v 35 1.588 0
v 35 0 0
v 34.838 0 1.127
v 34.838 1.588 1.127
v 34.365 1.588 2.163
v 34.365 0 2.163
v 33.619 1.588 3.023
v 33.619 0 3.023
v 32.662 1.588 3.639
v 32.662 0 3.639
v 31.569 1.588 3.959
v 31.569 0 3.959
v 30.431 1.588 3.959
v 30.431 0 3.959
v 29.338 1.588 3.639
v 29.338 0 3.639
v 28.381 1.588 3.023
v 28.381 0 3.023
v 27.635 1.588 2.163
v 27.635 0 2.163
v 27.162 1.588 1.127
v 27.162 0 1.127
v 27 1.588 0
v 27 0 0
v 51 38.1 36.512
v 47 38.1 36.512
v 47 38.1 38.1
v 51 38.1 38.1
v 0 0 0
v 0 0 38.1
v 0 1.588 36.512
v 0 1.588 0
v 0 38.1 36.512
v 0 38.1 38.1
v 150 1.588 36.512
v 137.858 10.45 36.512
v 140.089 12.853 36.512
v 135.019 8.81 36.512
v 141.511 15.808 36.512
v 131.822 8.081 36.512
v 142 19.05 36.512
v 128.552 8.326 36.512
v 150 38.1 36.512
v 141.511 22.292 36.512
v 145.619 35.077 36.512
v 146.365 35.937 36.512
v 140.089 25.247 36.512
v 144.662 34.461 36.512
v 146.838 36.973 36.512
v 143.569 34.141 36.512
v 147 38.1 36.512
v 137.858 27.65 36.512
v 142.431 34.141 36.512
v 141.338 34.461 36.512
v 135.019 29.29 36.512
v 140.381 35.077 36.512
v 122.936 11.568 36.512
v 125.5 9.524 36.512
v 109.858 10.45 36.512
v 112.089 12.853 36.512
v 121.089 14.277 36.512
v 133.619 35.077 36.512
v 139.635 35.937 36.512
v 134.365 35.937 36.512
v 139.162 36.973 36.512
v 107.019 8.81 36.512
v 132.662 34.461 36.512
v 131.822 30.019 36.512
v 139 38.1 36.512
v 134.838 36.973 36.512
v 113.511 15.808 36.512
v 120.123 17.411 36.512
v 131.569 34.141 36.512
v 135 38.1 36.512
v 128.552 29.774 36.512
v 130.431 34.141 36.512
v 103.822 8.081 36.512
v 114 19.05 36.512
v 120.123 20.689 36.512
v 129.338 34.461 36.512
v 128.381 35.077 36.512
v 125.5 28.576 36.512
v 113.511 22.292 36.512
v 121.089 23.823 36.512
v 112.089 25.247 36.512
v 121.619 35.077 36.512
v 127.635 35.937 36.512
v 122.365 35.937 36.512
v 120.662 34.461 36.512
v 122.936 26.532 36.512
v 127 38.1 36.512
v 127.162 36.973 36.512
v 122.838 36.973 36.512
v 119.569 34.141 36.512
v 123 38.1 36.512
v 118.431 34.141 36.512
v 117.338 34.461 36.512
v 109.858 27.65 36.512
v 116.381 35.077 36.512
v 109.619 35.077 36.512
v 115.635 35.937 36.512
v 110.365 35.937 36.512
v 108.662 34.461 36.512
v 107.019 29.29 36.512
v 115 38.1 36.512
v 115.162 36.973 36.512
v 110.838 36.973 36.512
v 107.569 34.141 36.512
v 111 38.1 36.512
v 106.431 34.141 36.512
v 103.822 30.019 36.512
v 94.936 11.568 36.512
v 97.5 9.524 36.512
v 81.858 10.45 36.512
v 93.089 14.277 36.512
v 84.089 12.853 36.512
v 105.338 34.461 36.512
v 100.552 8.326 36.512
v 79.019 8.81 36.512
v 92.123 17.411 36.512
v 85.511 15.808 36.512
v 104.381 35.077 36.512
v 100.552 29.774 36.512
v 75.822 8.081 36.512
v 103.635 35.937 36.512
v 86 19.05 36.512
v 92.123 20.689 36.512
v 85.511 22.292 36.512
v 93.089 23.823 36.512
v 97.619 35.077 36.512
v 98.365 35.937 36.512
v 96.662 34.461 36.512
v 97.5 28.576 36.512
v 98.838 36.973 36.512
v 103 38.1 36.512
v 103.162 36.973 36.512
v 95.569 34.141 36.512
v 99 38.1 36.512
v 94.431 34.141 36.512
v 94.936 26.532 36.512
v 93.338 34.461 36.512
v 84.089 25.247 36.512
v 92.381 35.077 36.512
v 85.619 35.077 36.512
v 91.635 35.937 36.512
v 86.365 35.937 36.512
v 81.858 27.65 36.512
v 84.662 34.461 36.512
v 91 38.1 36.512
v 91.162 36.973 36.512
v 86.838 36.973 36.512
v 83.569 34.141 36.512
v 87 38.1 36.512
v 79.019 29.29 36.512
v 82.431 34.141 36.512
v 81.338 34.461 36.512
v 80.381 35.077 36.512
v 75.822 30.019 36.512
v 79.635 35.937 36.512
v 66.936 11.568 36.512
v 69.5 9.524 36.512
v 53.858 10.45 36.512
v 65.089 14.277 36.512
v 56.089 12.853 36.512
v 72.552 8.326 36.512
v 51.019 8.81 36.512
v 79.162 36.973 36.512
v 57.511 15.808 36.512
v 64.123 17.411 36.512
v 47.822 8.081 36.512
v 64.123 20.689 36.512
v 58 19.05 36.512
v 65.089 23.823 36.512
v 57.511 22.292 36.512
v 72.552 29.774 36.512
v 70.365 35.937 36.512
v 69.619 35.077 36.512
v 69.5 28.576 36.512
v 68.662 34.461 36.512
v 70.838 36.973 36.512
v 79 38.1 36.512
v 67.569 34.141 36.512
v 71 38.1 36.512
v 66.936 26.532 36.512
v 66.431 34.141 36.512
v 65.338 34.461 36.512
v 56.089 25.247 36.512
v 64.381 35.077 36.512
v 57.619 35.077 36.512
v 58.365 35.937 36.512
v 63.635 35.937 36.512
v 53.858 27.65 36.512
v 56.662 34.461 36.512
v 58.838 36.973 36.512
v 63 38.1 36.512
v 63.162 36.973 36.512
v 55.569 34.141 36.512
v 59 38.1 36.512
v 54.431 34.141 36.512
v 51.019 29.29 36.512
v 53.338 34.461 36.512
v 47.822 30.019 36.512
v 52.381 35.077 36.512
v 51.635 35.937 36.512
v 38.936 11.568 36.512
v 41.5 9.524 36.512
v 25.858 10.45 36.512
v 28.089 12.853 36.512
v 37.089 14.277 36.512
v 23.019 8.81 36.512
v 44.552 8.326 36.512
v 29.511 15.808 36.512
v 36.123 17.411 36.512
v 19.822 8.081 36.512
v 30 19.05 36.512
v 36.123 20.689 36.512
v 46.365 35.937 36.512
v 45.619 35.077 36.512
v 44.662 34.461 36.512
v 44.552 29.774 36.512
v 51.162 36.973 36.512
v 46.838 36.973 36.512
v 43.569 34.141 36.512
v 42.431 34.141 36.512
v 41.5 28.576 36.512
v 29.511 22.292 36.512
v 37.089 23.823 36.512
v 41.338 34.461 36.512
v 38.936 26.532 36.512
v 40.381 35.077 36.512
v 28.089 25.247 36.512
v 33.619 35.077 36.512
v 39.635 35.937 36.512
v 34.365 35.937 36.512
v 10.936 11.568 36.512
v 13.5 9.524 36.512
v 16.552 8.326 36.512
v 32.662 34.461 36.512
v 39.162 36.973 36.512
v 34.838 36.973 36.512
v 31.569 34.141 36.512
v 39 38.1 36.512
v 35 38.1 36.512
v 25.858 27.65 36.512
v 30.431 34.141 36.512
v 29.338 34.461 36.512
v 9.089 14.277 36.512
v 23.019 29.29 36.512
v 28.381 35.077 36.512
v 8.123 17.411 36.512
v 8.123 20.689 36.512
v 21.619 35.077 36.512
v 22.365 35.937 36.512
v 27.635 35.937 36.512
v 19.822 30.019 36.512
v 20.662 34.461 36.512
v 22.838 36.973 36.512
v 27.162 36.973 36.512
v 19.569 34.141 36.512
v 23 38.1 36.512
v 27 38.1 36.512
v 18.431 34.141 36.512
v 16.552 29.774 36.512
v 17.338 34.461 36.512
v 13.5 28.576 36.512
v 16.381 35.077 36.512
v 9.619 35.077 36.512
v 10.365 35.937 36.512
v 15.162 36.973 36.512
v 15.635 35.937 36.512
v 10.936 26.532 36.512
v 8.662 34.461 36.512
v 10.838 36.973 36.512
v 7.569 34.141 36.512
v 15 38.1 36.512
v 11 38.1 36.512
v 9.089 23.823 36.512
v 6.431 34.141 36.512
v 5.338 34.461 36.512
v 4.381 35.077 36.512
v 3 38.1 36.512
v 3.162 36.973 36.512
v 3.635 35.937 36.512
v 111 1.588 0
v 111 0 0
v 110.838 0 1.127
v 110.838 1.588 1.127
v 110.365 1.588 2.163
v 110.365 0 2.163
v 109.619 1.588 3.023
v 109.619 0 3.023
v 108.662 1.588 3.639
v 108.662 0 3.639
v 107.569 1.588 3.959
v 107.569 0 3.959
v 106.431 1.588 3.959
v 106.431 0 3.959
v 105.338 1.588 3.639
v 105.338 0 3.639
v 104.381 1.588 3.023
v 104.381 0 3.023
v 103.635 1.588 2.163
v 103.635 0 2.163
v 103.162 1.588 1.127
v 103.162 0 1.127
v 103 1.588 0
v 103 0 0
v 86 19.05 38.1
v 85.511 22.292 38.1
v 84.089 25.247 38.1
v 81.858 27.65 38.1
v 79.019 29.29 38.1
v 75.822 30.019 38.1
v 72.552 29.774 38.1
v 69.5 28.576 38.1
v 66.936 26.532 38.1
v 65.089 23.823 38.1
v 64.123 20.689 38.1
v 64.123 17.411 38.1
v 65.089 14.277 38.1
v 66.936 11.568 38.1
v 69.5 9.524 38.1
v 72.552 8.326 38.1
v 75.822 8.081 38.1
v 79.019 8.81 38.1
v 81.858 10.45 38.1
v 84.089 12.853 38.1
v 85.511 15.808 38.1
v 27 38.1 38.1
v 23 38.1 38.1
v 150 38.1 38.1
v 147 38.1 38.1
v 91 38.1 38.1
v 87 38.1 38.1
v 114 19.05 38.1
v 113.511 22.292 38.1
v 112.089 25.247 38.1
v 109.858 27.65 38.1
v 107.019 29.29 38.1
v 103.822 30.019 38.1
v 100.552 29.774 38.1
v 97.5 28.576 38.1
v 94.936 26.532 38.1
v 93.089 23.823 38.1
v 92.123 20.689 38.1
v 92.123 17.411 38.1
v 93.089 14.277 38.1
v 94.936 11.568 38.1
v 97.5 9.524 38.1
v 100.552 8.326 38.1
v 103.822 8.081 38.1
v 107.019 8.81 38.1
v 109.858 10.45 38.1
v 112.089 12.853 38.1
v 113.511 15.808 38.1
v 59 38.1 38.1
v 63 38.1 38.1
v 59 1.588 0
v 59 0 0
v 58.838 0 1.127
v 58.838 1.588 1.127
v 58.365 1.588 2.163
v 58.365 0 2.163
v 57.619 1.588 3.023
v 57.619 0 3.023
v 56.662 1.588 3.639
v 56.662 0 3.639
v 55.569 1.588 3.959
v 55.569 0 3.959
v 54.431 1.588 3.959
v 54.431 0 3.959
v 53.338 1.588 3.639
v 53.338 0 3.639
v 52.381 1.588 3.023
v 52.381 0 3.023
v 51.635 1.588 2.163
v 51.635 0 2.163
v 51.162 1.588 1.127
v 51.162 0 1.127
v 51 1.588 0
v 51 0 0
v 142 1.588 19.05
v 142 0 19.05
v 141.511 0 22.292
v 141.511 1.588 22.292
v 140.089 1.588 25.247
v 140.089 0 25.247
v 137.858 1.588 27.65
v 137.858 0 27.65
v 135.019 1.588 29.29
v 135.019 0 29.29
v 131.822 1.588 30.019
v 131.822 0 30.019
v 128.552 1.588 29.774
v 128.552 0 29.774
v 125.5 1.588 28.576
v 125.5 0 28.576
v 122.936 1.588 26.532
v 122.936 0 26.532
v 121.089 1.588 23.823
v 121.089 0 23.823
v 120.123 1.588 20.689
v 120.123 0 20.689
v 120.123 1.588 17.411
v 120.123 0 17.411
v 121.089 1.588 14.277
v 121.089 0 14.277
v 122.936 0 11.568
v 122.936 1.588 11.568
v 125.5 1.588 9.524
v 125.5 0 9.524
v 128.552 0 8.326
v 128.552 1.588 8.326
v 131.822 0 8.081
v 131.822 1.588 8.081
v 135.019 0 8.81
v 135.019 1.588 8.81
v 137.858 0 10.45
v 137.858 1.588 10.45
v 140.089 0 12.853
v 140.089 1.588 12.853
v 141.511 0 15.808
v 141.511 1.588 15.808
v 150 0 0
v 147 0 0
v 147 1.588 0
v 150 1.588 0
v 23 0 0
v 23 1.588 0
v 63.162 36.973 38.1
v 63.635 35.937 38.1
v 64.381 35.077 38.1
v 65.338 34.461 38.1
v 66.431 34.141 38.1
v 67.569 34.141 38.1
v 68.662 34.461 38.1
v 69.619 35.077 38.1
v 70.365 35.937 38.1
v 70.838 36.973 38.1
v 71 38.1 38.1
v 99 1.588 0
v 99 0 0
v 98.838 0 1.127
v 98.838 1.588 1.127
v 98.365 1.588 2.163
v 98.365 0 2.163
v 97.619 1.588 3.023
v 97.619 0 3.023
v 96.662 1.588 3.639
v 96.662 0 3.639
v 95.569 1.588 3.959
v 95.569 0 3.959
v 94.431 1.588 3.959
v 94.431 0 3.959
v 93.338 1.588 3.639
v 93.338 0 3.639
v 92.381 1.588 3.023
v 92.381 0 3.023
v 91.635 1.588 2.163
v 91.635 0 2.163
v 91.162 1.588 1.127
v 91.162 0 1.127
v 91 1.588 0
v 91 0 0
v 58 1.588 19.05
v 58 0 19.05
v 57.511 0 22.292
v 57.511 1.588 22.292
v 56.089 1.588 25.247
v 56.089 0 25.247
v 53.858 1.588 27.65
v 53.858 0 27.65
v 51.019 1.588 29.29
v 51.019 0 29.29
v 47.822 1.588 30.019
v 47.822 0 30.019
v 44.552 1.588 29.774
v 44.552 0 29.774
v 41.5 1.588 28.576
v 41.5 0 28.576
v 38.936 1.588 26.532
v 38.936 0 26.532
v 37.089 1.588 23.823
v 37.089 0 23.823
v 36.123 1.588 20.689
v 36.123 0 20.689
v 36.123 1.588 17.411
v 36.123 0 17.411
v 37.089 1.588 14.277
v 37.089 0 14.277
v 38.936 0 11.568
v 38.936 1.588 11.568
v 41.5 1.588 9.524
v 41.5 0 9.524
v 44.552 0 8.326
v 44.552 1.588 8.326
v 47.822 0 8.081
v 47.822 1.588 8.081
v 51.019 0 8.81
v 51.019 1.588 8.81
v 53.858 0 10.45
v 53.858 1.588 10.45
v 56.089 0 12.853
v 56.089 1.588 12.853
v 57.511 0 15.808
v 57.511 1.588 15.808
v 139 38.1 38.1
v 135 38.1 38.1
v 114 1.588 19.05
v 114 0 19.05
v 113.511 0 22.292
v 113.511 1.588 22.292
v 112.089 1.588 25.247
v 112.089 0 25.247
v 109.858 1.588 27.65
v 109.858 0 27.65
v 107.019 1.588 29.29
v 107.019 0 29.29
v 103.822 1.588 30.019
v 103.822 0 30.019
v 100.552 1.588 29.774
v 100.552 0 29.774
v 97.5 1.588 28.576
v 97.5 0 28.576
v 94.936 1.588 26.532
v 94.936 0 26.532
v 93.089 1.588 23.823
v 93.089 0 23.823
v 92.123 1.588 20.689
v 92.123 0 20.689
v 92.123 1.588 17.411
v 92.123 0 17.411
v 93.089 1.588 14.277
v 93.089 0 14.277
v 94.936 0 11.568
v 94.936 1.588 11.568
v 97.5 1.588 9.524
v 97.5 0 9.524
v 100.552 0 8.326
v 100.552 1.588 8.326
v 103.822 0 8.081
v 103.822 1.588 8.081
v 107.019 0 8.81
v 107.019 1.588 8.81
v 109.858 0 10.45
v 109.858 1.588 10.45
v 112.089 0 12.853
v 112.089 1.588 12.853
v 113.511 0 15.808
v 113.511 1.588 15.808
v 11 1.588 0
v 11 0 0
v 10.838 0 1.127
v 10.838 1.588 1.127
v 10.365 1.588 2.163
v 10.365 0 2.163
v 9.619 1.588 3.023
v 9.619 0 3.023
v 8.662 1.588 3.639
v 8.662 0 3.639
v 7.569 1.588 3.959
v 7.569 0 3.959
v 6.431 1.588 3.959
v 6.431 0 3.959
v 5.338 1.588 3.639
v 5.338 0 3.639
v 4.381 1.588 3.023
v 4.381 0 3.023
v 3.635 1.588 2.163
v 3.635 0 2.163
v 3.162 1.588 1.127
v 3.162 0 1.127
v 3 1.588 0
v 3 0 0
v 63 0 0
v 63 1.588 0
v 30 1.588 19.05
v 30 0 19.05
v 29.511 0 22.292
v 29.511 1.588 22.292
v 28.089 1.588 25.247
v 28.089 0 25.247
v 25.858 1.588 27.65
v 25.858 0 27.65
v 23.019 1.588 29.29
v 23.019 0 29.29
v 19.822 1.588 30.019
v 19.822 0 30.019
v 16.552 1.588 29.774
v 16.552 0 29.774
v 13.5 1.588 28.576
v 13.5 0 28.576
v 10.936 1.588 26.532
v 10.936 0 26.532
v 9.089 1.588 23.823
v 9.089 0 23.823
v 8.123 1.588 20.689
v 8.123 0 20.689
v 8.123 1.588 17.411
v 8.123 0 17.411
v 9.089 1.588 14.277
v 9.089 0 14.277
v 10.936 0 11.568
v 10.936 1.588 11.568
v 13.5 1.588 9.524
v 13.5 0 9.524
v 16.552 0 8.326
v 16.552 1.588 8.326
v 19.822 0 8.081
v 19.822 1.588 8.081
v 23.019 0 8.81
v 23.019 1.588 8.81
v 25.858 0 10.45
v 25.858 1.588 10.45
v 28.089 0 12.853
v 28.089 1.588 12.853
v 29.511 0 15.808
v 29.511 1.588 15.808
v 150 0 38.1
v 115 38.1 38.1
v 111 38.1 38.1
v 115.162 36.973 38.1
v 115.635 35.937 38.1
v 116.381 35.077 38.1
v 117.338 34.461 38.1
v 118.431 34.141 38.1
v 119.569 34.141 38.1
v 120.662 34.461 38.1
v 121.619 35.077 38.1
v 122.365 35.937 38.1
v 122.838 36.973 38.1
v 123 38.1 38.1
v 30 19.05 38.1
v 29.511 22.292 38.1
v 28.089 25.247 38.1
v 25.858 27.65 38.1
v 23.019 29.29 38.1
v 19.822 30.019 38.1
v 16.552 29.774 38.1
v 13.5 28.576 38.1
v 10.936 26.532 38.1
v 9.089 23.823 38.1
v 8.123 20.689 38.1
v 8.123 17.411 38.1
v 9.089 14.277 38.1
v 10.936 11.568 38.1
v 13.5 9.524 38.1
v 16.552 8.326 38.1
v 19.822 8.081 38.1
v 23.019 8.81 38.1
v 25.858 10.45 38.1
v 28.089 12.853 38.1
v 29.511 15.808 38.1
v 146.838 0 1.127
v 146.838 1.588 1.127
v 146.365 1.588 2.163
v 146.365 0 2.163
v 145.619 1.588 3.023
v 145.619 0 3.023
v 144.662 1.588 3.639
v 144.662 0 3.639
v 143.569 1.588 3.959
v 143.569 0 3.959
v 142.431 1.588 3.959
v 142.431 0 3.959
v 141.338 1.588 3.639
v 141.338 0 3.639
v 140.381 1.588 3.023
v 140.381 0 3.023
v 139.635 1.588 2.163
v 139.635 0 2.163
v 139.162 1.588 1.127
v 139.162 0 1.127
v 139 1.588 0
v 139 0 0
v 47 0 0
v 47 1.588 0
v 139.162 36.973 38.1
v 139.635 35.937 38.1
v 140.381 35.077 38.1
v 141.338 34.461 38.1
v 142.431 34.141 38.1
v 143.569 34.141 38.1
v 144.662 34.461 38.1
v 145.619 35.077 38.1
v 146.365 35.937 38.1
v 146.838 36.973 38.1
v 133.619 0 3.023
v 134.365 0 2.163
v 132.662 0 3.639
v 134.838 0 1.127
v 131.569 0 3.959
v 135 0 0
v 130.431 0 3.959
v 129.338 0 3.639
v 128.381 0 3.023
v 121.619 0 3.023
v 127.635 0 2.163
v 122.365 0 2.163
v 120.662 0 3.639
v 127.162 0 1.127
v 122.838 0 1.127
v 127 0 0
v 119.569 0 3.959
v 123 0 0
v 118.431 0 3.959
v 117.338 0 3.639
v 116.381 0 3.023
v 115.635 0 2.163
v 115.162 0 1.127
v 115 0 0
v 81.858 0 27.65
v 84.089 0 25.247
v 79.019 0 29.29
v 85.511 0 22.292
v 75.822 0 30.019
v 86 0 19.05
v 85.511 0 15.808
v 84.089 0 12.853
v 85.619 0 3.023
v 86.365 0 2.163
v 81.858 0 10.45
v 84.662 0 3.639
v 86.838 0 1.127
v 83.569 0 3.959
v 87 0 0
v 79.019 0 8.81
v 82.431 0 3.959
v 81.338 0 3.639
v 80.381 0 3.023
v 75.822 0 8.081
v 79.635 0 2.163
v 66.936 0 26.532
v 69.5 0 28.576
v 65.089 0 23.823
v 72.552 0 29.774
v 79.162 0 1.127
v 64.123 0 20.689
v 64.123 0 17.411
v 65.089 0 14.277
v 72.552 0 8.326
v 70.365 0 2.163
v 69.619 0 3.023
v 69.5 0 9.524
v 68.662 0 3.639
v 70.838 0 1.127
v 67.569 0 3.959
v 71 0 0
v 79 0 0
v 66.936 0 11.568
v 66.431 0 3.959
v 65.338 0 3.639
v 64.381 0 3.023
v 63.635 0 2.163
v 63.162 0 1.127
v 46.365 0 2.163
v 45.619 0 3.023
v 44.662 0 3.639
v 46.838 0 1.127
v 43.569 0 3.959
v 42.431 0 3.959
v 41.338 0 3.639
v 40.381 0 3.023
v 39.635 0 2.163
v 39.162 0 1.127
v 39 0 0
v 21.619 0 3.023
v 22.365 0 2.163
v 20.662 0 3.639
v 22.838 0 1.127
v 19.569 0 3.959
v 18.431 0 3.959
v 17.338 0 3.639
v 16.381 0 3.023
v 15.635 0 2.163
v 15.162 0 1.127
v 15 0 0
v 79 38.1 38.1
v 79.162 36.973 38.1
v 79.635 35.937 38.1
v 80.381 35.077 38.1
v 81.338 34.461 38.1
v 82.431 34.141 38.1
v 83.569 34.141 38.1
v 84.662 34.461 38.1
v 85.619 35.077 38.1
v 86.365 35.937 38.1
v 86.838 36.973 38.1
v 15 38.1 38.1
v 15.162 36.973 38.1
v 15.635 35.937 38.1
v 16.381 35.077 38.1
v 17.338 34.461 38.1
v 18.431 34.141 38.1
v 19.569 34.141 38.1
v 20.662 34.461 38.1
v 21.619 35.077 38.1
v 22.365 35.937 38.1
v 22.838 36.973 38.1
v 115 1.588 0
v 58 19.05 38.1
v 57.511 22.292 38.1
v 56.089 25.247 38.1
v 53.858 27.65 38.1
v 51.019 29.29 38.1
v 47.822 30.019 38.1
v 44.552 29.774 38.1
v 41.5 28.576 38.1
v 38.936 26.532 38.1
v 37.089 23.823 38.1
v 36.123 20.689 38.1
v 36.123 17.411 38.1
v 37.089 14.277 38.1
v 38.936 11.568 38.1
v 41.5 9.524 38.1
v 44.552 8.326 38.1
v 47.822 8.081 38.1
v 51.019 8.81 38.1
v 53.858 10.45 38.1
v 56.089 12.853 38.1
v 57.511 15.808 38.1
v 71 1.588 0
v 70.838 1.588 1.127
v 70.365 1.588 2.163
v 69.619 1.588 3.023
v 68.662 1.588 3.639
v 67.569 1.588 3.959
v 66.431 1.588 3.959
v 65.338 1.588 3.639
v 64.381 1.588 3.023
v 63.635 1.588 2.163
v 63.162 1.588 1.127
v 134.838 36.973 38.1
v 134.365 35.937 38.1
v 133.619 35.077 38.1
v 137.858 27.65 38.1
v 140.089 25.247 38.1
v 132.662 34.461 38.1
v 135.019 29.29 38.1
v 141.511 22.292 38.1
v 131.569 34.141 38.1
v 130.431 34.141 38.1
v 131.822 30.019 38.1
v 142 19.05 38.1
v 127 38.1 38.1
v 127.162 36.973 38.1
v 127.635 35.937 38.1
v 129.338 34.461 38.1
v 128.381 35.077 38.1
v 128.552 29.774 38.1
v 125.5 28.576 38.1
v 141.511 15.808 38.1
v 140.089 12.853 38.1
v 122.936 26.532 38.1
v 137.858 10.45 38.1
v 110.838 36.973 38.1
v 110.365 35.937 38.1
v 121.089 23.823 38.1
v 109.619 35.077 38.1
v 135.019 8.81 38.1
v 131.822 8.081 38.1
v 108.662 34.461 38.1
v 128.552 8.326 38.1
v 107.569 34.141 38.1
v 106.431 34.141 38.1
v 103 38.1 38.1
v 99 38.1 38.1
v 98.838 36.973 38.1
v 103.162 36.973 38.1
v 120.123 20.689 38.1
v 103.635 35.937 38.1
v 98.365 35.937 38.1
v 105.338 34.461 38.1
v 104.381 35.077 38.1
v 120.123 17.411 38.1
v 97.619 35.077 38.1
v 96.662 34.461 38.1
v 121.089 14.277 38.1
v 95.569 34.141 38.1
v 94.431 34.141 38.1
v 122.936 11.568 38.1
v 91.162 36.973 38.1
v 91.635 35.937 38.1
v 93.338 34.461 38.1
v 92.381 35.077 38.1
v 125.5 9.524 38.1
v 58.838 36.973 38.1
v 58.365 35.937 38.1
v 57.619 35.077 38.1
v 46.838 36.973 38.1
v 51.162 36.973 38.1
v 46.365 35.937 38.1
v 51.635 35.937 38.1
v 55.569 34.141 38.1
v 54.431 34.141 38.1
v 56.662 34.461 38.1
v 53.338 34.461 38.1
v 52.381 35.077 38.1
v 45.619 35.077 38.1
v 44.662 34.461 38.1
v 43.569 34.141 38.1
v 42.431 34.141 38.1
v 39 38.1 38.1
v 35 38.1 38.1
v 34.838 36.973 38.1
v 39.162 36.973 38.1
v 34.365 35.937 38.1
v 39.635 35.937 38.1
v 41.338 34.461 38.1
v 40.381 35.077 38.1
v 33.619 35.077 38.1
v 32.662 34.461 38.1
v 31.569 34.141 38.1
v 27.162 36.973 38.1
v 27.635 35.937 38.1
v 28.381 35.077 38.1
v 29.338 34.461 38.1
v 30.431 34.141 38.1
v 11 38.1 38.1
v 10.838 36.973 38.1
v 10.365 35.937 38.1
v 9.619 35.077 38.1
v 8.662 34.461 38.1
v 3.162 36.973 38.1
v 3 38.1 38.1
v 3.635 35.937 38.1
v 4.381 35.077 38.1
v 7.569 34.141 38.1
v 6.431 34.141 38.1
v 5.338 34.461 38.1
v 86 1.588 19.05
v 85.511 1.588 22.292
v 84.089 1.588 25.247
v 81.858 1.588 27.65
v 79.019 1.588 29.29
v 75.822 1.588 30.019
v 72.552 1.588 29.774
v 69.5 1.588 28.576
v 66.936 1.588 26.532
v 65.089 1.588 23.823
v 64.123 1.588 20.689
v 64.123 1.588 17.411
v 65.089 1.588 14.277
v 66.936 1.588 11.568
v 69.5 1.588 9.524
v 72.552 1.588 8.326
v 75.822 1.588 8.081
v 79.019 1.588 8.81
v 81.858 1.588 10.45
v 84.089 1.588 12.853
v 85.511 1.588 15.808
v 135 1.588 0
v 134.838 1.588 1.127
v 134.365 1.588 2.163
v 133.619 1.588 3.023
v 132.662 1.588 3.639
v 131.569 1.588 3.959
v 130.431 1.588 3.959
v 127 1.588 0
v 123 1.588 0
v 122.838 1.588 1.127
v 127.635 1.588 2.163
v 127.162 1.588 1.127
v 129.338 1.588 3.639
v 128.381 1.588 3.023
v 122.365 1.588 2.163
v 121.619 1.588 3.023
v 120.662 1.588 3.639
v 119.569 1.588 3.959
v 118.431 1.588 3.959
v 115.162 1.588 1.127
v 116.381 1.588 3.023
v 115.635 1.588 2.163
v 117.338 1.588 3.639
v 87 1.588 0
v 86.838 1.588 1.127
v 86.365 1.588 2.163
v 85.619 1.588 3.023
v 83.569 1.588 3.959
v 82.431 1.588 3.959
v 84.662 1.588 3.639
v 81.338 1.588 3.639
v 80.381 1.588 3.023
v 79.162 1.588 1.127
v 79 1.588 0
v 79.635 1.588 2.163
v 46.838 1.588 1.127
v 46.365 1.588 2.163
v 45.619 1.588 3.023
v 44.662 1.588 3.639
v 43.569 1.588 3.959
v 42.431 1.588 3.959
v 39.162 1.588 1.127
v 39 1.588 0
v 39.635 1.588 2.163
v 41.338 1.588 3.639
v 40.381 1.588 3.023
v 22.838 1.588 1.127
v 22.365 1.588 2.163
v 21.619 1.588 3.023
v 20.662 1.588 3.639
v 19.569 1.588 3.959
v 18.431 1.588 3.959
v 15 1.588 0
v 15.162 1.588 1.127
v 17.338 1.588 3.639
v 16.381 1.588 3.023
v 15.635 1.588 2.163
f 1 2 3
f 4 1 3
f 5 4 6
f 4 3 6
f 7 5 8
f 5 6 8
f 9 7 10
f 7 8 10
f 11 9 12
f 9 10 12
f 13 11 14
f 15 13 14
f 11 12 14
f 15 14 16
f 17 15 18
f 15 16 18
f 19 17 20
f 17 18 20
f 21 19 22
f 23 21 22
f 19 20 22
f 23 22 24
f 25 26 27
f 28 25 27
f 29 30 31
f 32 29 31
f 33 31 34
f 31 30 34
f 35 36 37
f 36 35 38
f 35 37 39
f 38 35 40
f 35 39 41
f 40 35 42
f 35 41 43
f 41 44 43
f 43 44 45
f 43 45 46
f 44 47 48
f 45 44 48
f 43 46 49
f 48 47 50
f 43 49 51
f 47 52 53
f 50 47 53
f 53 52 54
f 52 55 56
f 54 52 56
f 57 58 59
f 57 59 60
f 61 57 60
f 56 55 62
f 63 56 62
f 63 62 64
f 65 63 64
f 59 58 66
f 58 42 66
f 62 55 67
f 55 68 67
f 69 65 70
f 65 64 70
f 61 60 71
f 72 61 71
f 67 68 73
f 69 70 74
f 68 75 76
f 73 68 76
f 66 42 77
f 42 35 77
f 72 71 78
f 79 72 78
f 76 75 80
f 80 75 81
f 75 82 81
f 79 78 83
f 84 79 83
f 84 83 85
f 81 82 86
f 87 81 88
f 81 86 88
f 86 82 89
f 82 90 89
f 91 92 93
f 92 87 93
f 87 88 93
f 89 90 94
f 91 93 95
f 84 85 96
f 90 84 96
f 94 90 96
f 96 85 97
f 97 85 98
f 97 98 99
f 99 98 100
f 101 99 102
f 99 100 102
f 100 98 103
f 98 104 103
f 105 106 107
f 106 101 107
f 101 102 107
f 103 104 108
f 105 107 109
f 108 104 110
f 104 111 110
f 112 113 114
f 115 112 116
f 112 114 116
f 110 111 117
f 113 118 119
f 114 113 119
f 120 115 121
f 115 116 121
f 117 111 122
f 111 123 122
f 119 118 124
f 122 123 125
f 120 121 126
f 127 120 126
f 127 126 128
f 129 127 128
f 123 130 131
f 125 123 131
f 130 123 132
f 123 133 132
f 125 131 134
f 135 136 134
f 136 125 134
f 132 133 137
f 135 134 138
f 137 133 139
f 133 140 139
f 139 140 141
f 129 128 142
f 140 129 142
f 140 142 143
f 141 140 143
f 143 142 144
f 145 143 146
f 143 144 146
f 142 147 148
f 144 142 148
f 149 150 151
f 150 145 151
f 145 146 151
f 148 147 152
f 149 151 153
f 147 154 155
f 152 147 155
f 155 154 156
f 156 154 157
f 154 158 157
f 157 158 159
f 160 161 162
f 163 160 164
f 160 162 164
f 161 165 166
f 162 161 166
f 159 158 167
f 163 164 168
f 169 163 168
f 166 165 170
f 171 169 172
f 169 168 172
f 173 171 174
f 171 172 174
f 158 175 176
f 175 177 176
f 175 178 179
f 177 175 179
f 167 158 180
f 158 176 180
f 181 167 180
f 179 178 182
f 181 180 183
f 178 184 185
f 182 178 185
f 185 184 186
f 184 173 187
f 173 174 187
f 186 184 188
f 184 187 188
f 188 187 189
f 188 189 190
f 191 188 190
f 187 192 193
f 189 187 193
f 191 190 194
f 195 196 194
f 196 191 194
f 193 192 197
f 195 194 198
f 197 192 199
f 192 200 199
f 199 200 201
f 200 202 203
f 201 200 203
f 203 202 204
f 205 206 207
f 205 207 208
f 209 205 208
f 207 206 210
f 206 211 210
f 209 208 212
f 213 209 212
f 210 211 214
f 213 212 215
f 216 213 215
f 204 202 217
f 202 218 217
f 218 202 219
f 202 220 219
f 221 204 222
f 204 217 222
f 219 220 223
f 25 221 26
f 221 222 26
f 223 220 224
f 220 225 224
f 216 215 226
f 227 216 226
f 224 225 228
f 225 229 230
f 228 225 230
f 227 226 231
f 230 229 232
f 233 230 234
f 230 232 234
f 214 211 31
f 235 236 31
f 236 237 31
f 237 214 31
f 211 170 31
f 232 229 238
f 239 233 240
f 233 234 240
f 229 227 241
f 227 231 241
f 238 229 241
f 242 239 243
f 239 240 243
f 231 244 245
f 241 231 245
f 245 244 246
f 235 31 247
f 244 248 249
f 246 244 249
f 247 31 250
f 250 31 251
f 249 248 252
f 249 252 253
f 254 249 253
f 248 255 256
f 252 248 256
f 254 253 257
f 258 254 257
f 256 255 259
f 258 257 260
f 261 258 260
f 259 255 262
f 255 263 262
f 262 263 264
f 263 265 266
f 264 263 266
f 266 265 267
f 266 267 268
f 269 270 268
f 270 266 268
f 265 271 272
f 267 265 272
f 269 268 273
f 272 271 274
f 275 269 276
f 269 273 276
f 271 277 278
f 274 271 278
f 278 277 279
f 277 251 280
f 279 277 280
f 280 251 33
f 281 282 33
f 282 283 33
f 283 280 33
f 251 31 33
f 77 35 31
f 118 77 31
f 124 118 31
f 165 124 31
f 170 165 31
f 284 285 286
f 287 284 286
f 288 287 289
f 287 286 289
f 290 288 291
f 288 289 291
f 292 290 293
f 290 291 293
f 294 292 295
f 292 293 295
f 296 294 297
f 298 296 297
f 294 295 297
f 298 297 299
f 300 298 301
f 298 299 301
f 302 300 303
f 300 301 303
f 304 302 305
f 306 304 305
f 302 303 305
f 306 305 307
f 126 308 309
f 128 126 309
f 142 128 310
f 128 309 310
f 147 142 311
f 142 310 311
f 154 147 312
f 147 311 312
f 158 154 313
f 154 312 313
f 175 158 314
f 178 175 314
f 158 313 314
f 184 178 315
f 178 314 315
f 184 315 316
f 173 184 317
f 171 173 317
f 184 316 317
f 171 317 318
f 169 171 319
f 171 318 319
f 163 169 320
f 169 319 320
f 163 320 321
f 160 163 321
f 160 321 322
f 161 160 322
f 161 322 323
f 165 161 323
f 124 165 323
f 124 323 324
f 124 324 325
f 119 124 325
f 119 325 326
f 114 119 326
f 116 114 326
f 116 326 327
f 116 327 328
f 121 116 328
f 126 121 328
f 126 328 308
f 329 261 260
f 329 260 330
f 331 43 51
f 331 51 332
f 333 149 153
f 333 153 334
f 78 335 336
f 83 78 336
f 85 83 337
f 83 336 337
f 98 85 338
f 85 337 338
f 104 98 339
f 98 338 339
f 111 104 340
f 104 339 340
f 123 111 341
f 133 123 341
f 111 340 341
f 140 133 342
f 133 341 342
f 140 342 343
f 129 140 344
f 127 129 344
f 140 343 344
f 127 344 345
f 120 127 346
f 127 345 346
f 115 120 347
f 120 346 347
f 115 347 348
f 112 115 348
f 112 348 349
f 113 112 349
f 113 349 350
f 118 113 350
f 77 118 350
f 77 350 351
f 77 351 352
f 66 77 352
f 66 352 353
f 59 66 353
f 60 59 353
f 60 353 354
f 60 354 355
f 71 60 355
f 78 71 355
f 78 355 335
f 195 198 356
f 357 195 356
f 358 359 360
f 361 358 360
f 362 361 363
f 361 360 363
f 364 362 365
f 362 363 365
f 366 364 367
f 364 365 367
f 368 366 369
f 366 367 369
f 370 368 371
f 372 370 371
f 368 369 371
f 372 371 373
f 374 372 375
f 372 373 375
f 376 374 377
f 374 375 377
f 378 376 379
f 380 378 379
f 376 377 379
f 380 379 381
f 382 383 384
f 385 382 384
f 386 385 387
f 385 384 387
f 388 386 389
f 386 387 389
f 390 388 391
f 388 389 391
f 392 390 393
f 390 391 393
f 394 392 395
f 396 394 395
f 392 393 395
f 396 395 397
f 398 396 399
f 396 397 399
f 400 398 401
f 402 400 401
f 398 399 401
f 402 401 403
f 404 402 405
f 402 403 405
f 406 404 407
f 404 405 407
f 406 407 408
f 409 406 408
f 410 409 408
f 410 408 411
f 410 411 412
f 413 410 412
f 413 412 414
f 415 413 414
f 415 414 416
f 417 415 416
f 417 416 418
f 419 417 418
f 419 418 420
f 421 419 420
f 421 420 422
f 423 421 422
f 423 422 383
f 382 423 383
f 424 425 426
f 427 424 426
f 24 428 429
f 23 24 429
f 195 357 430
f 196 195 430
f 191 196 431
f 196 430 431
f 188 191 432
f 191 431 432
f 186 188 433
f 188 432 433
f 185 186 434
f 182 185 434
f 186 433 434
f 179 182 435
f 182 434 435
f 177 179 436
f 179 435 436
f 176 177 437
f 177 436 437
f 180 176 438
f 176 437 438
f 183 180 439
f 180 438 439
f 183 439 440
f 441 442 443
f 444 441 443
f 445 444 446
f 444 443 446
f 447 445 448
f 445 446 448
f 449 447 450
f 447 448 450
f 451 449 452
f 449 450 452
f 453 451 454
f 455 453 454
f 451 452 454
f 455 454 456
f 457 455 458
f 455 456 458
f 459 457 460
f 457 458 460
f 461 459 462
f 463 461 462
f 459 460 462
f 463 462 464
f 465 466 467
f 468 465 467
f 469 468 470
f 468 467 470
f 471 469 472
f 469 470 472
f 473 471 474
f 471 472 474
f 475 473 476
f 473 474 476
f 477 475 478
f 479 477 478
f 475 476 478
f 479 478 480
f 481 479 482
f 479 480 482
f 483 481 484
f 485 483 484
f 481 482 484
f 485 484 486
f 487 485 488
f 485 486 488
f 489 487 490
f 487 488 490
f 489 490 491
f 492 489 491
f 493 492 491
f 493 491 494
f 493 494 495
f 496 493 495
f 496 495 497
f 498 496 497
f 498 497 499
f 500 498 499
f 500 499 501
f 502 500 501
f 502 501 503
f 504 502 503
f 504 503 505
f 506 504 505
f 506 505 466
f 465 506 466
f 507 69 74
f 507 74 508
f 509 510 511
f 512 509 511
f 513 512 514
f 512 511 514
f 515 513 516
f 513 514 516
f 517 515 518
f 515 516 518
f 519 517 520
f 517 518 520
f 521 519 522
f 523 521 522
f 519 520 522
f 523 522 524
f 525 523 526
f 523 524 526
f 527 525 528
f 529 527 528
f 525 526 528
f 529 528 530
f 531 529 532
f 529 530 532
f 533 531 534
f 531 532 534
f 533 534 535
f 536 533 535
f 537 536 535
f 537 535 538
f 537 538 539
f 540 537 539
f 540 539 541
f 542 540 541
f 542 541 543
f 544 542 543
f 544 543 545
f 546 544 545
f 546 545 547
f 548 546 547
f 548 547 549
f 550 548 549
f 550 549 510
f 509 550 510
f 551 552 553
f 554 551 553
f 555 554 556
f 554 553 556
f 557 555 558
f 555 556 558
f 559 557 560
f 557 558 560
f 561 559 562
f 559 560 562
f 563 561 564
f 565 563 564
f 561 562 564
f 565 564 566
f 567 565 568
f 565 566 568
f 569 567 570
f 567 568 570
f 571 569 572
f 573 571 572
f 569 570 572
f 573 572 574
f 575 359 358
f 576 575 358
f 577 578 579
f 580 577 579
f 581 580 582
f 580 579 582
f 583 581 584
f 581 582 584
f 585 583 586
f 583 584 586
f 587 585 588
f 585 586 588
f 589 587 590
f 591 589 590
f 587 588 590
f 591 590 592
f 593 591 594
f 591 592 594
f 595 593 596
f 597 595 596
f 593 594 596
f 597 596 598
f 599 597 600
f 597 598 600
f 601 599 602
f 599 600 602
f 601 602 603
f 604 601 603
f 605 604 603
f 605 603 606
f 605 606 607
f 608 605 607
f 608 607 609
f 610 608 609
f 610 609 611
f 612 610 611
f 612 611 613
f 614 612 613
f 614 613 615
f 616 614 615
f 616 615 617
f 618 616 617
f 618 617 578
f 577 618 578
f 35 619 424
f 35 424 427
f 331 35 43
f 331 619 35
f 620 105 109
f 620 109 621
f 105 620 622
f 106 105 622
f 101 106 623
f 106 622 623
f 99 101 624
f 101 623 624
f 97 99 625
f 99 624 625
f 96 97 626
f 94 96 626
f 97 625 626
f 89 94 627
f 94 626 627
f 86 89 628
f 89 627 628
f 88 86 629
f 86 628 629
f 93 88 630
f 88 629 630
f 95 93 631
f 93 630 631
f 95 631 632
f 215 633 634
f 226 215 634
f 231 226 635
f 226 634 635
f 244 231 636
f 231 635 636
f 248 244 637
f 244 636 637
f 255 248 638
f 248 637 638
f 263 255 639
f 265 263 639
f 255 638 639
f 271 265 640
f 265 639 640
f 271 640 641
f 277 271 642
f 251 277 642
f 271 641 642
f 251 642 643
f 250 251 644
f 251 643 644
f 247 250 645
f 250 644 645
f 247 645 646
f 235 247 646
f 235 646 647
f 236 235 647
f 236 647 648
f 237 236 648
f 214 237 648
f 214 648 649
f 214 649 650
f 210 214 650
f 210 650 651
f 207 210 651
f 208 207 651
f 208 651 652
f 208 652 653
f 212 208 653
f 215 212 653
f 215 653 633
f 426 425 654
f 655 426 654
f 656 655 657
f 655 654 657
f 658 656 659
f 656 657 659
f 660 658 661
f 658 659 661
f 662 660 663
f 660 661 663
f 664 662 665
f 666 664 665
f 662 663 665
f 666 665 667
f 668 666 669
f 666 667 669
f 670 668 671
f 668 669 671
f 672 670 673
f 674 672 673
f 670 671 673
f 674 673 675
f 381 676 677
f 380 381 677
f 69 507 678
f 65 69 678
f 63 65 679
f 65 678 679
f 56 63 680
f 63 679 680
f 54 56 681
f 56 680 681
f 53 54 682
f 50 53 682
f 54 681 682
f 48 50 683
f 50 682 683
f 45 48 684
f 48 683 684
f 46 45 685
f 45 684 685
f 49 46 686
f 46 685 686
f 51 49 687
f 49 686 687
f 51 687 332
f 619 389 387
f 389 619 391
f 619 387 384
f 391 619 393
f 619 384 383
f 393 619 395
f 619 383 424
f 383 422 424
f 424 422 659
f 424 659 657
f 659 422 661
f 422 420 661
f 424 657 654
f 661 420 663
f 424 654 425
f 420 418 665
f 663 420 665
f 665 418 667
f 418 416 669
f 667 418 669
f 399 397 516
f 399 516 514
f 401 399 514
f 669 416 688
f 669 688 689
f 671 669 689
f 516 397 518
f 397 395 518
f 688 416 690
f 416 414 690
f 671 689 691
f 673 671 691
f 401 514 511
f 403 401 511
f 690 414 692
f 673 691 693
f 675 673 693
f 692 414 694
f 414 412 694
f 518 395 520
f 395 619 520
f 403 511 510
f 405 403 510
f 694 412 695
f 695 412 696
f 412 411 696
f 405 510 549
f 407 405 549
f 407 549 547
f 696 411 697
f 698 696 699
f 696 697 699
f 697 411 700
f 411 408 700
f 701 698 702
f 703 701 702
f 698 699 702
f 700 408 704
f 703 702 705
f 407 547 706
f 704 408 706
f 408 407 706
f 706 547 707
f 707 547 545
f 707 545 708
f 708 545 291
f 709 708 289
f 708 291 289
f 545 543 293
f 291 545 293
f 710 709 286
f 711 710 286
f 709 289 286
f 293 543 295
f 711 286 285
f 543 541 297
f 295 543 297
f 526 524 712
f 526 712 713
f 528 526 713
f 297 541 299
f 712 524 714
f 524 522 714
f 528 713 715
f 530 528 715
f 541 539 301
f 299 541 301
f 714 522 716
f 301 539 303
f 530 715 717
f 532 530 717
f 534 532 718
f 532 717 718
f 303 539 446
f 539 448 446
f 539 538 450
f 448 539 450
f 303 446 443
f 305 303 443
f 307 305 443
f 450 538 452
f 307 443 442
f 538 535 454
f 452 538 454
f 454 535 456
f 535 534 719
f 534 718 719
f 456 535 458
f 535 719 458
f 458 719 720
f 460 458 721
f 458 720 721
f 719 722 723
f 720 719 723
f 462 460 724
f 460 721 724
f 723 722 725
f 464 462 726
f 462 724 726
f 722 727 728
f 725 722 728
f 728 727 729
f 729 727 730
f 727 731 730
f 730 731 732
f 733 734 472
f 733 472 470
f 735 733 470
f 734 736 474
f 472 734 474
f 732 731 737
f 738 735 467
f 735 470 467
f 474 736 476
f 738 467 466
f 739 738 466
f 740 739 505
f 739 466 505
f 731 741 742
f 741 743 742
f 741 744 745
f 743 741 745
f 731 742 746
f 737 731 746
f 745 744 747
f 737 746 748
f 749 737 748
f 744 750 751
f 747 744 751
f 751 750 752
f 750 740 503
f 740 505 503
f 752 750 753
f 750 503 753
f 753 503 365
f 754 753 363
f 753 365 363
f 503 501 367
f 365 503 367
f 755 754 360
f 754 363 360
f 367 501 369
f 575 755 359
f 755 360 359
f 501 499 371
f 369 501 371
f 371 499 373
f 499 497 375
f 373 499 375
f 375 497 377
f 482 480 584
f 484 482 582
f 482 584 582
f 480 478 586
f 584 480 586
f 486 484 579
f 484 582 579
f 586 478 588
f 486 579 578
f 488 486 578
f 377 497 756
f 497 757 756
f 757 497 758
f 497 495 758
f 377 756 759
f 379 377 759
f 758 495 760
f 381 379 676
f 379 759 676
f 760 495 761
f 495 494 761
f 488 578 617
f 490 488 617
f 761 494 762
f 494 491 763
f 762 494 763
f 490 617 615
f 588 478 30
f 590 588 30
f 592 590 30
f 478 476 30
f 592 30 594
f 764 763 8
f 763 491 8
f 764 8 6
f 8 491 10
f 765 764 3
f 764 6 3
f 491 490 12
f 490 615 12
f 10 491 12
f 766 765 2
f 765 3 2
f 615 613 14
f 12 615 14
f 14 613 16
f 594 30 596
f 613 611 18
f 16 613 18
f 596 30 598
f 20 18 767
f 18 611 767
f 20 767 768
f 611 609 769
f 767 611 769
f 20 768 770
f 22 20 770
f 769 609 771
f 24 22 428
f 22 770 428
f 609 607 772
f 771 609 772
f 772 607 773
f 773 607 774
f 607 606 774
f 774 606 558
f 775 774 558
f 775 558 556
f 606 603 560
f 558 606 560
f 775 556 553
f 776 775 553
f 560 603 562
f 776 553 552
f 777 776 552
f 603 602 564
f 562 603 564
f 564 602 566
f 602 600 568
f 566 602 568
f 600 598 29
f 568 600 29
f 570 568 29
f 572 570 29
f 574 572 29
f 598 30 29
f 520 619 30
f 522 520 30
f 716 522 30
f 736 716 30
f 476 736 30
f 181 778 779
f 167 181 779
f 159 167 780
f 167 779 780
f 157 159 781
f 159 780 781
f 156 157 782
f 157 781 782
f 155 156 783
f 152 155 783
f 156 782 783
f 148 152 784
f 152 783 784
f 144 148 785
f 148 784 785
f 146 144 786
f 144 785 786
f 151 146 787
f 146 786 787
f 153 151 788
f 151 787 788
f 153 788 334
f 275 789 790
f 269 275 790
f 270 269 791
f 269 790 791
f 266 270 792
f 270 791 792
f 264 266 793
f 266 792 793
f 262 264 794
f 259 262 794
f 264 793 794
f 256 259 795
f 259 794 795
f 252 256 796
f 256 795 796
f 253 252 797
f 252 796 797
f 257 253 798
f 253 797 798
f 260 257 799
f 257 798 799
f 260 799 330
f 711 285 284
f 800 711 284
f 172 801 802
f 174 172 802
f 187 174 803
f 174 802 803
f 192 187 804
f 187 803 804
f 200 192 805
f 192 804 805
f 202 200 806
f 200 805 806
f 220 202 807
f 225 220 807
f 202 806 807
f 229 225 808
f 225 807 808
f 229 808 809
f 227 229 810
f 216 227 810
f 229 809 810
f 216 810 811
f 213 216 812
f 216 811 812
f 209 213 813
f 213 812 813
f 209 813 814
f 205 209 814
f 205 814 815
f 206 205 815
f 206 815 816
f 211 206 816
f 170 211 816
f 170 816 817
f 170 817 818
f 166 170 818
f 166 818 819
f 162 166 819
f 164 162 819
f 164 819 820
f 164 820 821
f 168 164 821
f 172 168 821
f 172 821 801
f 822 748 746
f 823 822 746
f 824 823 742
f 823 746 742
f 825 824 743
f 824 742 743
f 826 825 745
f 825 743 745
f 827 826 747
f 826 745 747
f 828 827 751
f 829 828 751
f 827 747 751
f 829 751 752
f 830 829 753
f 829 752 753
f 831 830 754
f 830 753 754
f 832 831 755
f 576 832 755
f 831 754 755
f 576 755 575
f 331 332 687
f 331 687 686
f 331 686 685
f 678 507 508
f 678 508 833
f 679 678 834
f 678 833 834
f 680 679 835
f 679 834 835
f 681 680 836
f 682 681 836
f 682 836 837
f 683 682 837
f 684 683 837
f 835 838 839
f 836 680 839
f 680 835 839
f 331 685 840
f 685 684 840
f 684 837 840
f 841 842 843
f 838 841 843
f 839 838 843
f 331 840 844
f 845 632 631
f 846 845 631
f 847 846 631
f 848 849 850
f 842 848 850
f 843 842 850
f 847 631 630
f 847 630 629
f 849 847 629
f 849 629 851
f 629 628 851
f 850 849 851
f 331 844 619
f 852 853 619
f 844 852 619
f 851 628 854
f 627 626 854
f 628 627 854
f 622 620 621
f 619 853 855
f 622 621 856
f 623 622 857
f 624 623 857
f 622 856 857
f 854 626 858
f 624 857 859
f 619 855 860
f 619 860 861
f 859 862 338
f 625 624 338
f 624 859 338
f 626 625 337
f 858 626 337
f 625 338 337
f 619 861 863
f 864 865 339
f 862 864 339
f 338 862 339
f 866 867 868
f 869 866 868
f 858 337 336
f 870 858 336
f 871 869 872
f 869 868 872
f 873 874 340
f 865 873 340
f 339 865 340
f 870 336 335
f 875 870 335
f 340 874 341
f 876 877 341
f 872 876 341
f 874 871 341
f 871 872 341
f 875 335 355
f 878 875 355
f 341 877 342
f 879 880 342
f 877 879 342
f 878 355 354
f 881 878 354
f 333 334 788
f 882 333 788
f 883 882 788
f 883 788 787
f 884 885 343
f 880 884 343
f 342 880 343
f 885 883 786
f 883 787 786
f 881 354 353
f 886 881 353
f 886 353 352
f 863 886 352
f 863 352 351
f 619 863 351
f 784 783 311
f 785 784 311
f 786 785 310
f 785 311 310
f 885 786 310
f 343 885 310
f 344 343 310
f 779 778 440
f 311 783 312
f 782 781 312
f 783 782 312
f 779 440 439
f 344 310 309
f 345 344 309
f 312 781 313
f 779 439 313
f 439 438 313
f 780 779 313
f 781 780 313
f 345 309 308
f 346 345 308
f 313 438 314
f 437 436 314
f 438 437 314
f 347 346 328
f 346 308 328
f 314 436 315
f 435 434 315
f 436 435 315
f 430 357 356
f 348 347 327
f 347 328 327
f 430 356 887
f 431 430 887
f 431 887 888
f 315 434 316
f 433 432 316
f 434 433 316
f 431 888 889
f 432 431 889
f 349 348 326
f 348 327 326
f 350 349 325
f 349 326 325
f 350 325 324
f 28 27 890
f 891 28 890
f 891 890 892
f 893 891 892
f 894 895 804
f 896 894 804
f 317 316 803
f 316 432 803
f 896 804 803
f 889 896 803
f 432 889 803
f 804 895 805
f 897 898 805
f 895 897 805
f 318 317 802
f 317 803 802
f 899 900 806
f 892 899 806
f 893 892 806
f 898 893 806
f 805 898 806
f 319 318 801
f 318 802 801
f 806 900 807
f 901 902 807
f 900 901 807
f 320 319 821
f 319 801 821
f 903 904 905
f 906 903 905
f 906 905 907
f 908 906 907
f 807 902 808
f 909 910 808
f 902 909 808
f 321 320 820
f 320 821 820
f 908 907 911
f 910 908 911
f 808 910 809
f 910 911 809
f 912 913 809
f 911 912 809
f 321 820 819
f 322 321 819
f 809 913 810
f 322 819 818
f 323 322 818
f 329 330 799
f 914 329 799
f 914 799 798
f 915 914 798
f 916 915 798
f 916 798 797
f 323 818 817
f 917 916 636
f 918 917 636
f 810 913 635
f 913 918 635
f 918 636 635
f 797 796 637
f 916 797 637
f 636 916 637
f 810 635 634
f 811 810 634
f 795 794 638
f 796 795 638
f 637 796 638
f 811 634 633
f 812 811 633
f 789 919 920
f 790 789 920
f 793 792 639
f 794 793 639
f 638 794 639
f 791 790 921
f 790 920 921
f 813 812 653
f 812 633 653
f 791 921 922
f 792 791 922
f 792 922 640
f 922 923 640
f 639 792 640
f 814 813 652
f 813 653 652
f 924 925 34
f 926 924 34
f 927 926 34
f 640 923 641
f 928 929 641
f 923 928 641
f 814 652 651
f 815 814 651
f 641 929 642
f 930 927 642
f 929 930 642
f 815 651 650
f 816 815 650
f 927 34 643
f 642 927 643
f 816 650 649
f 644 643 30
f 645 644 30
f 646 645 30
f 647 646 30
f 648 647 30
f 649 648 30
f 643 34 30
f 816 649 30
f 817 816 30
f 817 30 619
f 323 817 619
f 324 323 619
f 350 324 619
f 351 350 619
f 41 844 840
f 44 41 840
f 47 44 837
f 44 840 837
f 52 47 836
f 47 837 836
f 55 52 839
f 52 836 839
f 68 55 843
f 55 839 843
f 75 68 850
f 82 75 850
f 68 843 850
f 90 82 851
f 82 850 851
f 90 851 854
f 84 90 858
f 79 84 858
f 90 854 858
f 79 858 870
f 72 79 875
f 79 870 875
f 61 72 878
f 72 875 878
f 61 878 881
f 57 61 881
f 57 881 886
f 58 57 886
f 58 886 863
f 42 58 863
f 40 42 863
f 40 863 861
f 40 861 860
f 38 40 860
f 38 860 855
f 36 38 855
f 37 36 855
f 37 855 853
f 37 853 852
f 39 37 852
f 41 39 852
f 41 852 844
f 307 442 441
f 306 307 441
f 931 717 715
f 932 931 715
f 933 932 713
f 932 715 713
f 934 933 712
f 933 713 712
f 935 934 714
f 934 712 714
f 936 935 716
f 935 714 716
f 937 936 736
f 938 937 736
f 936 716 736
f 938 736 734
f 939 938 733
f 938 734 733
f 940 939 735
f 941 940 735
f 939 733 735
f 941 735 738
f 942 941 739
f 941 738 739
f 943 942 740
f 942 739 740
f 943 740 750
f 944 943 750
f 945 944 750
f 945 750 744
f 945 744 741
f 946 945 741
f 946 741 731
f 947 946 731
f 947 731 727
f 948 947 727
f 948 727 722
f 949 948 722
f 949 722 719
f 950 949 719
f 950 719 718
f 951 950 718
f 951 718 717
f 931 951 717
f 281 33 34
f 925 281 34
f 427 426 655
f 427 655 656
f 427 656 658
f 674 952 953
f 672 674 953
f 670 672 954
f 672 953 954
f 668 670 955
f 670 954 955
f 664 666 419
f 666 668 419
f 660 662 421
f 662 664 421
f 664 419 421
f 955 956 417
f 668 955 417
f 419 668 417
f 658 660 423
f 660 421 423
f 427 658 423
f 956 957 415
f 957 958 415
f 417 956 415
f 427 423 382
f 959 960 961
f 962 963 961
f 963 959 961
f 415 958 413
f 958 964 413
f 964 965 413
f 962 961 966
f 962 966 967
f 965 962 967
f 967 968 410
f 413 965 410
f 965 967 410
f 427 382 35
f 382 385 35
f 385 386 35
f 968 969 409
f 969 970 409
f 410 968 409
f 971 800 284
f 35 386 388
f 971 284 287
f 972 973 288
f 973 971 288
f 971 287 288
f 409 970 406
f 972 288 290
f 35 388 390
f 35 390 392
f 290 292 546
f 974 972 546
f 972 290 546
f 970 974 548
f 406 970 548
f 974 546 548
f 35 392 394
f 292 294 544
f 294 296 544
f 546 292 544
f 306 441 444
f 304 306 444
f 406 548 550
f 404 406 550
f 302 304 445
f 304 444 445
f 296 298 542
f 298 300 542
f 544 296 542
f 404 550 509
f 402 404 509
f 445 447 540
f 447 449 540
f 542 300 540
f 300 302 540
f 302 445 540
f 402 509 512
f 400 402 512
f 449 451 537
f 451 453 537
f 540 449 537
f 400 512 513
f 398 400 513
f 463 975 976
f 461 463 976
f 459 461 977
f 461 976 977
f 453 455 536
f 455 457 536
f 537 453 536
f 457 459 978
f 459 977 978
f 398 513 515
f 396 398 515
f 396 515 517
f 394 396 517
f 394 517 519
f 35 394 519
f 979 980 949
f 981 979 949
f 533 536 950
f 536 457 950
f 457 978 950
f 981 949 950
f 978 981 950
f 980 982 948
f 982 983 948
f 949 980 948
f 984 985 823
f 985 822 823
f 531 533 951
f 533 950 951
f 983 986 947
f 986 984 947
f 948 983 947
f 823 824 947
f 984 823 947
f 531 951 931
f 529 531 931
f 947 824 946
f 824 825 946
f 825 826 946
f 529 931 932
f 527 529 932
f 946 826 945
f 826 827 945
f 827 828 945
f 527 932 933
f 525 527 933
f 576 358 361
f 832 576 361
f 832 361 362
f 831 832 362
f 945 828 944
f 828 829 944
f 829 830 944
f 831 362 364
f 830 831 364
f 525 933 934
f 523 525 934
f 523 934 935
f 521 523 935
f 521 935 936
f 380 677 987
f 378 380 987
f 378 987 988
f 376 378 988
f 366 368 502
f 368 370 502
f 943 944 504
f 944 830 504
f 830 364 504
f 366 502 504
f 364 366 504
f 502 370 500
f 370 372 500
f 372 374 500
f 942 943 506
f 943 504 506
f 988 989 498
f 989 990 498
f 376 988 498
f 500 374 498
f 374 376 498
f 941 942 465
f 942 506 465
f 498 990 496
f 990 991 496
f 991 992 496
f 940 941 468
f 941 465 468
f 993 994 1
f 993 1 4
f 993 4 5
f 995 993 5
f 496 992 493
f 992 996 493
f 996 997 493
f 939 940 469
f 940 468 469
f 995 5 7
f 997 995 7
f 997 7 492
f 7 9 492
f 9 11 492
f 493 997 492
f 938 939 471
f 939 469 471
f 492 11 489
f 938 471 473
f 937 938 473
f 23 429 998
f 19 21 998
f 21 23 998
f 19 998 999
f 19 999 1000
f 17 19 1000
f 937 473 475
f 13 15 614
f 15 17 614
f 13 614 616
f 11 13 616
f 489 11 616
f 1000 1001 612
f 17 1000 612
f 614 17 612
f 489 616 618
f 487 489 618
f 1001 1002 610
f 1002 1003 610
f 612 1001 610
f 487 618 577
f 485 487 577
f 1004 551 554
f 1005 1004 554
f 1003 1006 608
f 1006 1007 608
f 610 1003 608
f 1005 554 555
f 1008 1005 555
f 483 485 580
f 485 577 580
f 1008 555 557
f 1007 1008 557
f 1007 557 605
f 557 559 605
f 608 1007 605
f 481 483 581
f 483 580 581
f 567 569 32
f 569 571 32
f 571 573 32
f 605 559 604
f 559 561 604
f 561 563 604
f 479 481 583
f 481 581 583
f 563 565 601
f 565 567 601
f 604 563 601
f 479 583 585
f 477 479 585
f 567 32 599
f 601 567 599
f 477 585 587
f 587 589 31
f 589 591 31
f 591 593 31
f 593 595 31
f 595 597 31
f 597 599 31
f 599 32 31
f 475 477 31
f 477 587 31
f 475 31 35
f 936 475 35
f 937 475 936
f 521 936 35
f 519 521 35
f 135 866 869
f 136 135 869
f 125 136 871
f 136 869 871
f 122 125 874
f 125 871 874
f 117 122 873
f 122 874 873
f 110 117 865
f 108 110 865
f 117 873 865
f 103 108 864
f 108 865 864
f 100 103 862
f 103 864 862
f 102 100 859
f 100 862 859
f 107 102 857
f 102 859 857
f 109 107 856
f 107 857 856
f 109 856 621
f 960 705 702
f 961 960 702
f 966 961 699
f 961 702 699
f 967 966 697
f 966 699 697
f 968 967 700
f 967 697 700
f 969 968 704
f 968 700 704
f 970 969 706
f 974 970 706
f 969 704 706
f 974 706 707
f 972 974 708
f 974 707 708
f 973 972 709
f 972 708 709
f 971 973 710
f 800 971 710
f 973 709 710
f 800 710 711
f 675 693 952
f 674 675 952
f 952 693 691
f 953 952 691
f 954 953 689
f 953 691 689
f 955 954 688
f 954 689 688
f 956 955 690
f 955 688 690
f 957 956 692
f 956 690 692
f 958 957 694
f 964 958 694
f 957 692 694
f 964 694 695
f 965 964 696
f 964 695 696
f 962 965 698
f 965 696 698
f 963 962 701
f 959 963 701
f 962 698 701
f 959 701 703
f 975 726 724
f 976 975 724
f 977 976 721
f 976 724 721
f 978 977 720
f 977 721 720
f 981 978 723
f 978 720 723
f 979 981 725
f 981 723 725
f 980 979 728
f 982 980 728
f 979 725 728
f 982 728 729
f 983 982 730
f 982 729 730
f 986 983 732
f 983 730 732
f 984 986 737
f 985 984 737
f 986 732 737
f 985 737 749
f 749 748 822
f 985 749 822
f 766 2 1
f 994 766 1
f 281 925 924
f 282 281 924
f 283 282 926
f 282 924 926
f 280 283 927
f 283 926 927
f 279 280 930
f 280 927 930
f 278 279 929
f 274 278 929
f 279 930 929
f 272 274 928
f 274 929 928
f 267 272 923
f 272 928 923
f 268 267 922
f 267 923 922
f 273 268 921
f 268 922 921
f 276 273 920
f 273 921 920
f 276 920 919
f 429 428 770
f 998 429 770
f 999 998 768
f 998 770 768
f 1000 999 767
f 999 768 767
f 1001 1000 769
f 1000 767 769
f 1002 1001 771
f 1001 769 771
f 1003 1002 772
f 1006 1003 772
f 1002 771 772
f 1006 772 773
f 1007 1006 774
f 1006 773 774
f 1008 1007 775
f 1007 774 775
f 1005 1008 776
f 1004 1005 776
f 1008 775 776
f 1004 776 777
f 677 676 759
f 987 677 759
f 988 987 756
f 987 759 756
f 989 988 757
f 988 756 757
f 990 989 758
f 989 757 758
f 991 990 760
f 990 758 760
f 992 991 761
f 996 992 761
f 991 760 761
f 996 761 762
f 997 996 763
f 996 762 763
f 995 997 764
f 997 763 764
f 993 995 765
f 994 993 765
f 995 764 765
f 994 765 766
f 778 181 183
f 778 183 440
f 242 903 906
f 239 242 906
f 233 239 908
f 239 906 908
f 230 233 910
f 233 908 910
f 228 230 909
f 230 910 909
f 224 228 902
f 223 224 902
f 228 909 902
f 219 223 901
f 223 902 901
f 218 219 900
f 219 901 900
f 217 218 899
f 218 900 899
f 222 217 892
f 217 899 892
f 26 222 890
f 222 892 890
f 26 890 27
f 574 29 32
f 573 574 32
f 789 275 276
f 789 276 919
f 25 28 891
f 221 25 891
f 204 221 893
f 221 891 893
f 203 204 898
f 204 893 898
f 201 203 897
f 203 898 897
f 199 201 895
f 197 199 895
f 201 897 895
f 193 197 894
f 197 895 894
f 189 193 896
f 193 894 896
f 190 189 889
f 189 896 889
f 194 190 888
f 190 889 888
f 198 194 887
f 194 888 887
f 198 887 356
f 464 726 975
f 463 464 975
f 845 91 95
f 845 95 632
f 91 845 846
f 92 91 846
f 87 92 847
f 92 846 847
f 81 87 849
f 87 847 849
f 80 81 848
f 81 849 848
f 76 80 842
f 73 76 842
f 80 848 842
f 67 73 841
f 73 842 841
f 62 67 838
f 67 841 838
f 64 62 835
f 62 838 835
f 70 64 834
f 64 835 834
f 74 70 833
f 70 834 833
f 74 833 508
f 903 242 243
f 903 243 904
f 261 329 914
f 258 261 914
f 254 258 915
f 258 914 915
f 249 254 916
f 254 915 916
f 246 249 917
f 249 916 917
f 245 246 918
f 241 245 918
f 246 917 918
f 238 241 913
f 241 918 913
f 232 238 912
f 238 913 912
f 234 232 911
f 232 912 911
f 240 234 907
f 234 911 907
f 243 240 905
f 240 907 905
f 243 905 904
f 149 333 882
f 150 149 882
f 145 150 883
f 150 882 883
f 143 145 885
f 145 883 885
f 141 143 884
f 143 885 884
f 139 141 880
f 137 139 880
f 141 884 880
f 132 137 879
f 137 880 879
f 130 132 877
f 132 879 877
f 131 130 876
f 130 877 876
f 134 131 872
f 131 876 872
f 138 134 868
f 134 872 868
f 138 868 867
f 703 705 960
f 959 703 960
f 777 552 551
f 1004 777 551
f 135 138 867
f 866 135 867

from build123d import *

# Parameters (mm, degrees)
F1_DEPTH = 150
F2_R     = 11
F3_DEPTH = 38.101
F4_R     = 11
F5_DEPTH = 38.101


with BuildPart() as f1:
    # F0 (on Right) → F1 (new body)
    with BuildSketch(Plane.YZ):
        Polygon((0, 38.1), (0, 0), (1.5875, 0), (1.5875, 36.5125), (38.1, 36.5125), (38.1, 38.1), align=None)
    extrude(amount=F1_DEPTH)

    # F2 (on face) → F3 (cut, through all)
    with BuildSketch(Plane.XZ):
        with Locations((75, 19.05)):
            Circle(F2_R)
        with Locations((103, 19.05)):
            Circle(F2_R)
        with Locations((131, 19.05)):
            Circle(F2_R)
        with Locations((47, 19.05)):
            Circle(F2_R)
        with Locations((19, 19.05)):
            Circle(F2_R)
        with BuildLine():
            ThreePointArc((87, 0), (83, 4), (79, 0))
            Line((79, 0), (87, 0))
        make_face()
        with BuildLine():
            Line((91, 0), (99, 0))
            ThreePointArc((99, 0), (95, 4), (91, 0))
        make_face()
        with BuildLine():
            Line((103, 0), (111, 0))
            ThreePointArc((111, 0), (107, 4), (103, 0))
        make_face()
        with BuildLine():
            Line((115, 0), (123, 0))
            ThreePointArc((123, 0), (119, 4), (115, 0))
        make_face()
        with BuildLine():
            Line((127, 0), (135, 0))
            ThreePointArc((135, 0), (131, 4), (127, 0))
        make_face()
        with BuildLine():
            Line((139, 0), (147, 0))
            ThreePointArc((147, 0), (143, 4), (139, 0))
        make_face()
        with BuildLine():
            ThreePointArc((71, 0), (67, 4), (63, 0))
            Line((63, 0), (71, 0))
        make_face()
        with BuildLine():
            ThreePointArc((11, 0), (7, 4), (3, 0))
            Line((3, 0), (11, 0))
        make_face()
        with BuildLine():
            ThreePointArc((35, 0), (31, 4), (27, 0))
            Line((27, 0), (35, 0))
        make_face()
        with BuildLine():
            ThreePointArc((23, 0), (19, 4), (15, 0))
            Line((15, 0), (23, 0))
        make_face()
        with BuildLine():
            Line((39, 0), (47, 0))
            ThreePointArc((47, 0), (43, 4), (39, 0))
        make_face()
        with BuildLine():
            Line((51, 0), (59, 0))
            ThreePointArc((59, 0), (55, 4), (51, 0))
        make_face()
    extrude(amount=-F3_DEPTH, mode=Mode.SUBTRACT)

    # F4 (on face) → F5 (cut, through all)
    with BuildSketch(Plane.XY.offset(38.1)):
        with Locations((75, 19.05)):
            Circle(F4_R)
        with Locations((47, 19.05)):
            Circle(F4_R)
        with Locations((19, 19.05)):
            Circle(F4_R)
        with Locations((103, 19.05)):
            Circle(F4_R)
        with Locations((131, 19.05)):
            Circle(F4_R)
        with BuildLine():
            ThreePointArc((64.900003, 41.50441), (67, 34.1), (69.099998, 41.50441))
            Line((69.099998, 41.50441), (64.900003, 41.50441))
        make_face()
        with BuildLine():
            Line((57.099998, 41.50441), (52.900003, 41.50441))
            ThreePointArc((52.900003, 41.50441), (55, 34.1), (57.099998, 41.50441))
        make_face()
        with BuildLine():
            Line((45.099998, 41.50441), (40.900003, 41.50441))
            ThreePointArc((40.900003, 41.50441), (43, 34.1), (45.099998, 41.50441))
        make_face()
        with BuildLine():
            Line((33.099998, 41.50441), (28.900003, 41.50441))
            ThreePointArc((28.900003, 41.50441), (31, 34.1), (33.099998, 41.50441))
        make_face()
        with BuildLine():
            Line((21.099998, 41.50441), (16.900003, 41.50441))
            ThreePointArc((16.900003, 41.50441), (19, 34.1), (21.099998, 41.50441))
        make_face()
        with BuildLine():
            Line((9.099998, 41.50441), (4.900003, 41.50441))
            ThreePointArc((4.900003, 41.50441), (7, 34.1), (9.099998, 41.50441))
        make_face()
        with BuildLine():
            ThreePointArc((80.900003, 41.50441), (83, 34.1), (85.099998, 41.50441))
            Line((85.099998, 41.50441), (80.900003, 41.50441))
        make_face()
        with BuildLine():
            ThreePointArc((140.900003, 41.50441), (143, 34.1), (145.099998, 41.50441))
            Line((145.099998, 41.50441), (140.900003, 41.50441))
        make_face()
        with BuildLine():
            ThreePointArc((116.900003, 41.50441), (119, 34.1), (121.099998, 41.50441))
            Line((121.099998, 41.50441), (116.900003, 41.50441))
        make_face()
        with BuildLine():
            ThreePointArc((128.900003, 41.50441), (131, 34.1), (133.099998, 41.50441))
            Line((133.099998, 41.50441), (128.900003, 41.50441))
        make_face()
        with BuildLine():
            Line((109.099998, 41.50441), (104.900003, 41.50441))
            ThreePointArc((104.900003, 41.50441), (107, 34.1), (109.099998, 41.50441))
        make_face()
        with BuildLine():
            Line((97.099998, 41.50441), (92.900003, 41.50441))
            ThreePointArc((92.900003, 41.50441), (95, 34.1), (97.099998, 41.50441))
        make_face()
    extrude(amount=-F5_DEPTH, mode=Mode.SUBTRACT)


solid = f1.part
